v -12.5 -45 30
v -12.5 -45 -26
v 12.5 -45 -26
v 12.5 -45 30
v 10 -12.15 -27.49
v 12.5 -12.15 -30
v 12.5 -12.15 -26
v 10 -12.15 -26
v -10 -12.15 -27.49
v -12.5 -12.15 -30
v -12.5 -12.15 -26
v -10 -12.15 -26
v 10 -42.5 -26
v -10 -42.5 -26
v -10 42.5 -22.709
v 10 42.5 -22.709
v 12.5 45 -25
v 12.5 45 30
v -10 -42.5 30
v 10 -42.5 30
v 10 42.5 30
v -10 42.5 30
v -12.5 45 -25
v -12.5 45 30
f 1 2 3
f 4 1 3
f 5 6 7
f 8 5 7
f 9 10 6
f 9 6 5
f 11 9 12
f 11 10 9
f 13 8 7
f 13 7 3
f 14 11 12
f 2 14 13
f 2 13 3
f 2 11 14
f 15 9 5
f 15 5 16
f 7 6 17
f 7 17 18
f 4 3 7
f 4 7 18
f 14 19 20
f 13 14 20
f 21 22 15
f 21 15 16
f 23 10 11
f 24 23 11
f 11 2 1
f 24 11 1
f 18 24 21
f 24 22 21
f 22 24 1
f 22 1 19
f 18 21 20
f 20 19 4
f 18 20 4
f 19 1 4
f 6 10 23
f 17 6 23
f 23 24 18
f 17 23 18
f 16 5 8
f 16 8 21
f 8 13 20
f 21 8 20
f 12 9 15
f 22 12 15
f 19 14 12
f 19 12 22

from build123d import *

# Parameters (mm, degrees)
F0_W          = 25
F0_H          = 60
F1_DEPTH      = 45
F1_DEPTH_BACK = 45
F3_DEPTH      = 25
F4_W          = 32.849738
F4_H          = 4
F5_DEPTH      = 25
F6_T          = -2.5


with BuildPart() as f1:
    # F0 (on Front) → F1 (new body, two sides)
    with BuildSketch(Plane.XZ) as f1_sk:
        Rectangle(F0_W, F0_H)
    extrude(amount=F1_DEPTH)
    extrude(f1_sk.sketch, amount=-F1_DEPTH_BACK)

    # F2 (on face) → F3 (cut)
    with BuildSketch(Plane(origin=(-12.5, 0, 0), x_dir=(0, -1, 0), z_dir=(-1, 0, 0))):
        Polygon((-45, -30), (12.150262, -30), (-45, -25), align=None)
    extrude(amount=-F3_DEPTH, mode=Mode.SUBTRACT)

    # F4 (on face) → F5 (cut)
    with BuildSketch(Plane(origin=(-12.5, 0, 0), x_dir=(0, -1, 0), z_dir=(-1, 0, 0))):
        with Locations((28.575131, -28)):
            Rectangle(F4_W, F4_H)
    extrude(amount=-F5_DEPTH, mode=Mode.SUBTRACT)

    # F6
    f6_openings = [f1.faces().sort_by_distance(p)[0] for p in [
        (0, -28.575131, -26),
        (0, -12.150262, -28),
        (0, 0, 30),
    ]]
    offset(amount=F6_T, openings=f6_openings)


solid = f1.part
